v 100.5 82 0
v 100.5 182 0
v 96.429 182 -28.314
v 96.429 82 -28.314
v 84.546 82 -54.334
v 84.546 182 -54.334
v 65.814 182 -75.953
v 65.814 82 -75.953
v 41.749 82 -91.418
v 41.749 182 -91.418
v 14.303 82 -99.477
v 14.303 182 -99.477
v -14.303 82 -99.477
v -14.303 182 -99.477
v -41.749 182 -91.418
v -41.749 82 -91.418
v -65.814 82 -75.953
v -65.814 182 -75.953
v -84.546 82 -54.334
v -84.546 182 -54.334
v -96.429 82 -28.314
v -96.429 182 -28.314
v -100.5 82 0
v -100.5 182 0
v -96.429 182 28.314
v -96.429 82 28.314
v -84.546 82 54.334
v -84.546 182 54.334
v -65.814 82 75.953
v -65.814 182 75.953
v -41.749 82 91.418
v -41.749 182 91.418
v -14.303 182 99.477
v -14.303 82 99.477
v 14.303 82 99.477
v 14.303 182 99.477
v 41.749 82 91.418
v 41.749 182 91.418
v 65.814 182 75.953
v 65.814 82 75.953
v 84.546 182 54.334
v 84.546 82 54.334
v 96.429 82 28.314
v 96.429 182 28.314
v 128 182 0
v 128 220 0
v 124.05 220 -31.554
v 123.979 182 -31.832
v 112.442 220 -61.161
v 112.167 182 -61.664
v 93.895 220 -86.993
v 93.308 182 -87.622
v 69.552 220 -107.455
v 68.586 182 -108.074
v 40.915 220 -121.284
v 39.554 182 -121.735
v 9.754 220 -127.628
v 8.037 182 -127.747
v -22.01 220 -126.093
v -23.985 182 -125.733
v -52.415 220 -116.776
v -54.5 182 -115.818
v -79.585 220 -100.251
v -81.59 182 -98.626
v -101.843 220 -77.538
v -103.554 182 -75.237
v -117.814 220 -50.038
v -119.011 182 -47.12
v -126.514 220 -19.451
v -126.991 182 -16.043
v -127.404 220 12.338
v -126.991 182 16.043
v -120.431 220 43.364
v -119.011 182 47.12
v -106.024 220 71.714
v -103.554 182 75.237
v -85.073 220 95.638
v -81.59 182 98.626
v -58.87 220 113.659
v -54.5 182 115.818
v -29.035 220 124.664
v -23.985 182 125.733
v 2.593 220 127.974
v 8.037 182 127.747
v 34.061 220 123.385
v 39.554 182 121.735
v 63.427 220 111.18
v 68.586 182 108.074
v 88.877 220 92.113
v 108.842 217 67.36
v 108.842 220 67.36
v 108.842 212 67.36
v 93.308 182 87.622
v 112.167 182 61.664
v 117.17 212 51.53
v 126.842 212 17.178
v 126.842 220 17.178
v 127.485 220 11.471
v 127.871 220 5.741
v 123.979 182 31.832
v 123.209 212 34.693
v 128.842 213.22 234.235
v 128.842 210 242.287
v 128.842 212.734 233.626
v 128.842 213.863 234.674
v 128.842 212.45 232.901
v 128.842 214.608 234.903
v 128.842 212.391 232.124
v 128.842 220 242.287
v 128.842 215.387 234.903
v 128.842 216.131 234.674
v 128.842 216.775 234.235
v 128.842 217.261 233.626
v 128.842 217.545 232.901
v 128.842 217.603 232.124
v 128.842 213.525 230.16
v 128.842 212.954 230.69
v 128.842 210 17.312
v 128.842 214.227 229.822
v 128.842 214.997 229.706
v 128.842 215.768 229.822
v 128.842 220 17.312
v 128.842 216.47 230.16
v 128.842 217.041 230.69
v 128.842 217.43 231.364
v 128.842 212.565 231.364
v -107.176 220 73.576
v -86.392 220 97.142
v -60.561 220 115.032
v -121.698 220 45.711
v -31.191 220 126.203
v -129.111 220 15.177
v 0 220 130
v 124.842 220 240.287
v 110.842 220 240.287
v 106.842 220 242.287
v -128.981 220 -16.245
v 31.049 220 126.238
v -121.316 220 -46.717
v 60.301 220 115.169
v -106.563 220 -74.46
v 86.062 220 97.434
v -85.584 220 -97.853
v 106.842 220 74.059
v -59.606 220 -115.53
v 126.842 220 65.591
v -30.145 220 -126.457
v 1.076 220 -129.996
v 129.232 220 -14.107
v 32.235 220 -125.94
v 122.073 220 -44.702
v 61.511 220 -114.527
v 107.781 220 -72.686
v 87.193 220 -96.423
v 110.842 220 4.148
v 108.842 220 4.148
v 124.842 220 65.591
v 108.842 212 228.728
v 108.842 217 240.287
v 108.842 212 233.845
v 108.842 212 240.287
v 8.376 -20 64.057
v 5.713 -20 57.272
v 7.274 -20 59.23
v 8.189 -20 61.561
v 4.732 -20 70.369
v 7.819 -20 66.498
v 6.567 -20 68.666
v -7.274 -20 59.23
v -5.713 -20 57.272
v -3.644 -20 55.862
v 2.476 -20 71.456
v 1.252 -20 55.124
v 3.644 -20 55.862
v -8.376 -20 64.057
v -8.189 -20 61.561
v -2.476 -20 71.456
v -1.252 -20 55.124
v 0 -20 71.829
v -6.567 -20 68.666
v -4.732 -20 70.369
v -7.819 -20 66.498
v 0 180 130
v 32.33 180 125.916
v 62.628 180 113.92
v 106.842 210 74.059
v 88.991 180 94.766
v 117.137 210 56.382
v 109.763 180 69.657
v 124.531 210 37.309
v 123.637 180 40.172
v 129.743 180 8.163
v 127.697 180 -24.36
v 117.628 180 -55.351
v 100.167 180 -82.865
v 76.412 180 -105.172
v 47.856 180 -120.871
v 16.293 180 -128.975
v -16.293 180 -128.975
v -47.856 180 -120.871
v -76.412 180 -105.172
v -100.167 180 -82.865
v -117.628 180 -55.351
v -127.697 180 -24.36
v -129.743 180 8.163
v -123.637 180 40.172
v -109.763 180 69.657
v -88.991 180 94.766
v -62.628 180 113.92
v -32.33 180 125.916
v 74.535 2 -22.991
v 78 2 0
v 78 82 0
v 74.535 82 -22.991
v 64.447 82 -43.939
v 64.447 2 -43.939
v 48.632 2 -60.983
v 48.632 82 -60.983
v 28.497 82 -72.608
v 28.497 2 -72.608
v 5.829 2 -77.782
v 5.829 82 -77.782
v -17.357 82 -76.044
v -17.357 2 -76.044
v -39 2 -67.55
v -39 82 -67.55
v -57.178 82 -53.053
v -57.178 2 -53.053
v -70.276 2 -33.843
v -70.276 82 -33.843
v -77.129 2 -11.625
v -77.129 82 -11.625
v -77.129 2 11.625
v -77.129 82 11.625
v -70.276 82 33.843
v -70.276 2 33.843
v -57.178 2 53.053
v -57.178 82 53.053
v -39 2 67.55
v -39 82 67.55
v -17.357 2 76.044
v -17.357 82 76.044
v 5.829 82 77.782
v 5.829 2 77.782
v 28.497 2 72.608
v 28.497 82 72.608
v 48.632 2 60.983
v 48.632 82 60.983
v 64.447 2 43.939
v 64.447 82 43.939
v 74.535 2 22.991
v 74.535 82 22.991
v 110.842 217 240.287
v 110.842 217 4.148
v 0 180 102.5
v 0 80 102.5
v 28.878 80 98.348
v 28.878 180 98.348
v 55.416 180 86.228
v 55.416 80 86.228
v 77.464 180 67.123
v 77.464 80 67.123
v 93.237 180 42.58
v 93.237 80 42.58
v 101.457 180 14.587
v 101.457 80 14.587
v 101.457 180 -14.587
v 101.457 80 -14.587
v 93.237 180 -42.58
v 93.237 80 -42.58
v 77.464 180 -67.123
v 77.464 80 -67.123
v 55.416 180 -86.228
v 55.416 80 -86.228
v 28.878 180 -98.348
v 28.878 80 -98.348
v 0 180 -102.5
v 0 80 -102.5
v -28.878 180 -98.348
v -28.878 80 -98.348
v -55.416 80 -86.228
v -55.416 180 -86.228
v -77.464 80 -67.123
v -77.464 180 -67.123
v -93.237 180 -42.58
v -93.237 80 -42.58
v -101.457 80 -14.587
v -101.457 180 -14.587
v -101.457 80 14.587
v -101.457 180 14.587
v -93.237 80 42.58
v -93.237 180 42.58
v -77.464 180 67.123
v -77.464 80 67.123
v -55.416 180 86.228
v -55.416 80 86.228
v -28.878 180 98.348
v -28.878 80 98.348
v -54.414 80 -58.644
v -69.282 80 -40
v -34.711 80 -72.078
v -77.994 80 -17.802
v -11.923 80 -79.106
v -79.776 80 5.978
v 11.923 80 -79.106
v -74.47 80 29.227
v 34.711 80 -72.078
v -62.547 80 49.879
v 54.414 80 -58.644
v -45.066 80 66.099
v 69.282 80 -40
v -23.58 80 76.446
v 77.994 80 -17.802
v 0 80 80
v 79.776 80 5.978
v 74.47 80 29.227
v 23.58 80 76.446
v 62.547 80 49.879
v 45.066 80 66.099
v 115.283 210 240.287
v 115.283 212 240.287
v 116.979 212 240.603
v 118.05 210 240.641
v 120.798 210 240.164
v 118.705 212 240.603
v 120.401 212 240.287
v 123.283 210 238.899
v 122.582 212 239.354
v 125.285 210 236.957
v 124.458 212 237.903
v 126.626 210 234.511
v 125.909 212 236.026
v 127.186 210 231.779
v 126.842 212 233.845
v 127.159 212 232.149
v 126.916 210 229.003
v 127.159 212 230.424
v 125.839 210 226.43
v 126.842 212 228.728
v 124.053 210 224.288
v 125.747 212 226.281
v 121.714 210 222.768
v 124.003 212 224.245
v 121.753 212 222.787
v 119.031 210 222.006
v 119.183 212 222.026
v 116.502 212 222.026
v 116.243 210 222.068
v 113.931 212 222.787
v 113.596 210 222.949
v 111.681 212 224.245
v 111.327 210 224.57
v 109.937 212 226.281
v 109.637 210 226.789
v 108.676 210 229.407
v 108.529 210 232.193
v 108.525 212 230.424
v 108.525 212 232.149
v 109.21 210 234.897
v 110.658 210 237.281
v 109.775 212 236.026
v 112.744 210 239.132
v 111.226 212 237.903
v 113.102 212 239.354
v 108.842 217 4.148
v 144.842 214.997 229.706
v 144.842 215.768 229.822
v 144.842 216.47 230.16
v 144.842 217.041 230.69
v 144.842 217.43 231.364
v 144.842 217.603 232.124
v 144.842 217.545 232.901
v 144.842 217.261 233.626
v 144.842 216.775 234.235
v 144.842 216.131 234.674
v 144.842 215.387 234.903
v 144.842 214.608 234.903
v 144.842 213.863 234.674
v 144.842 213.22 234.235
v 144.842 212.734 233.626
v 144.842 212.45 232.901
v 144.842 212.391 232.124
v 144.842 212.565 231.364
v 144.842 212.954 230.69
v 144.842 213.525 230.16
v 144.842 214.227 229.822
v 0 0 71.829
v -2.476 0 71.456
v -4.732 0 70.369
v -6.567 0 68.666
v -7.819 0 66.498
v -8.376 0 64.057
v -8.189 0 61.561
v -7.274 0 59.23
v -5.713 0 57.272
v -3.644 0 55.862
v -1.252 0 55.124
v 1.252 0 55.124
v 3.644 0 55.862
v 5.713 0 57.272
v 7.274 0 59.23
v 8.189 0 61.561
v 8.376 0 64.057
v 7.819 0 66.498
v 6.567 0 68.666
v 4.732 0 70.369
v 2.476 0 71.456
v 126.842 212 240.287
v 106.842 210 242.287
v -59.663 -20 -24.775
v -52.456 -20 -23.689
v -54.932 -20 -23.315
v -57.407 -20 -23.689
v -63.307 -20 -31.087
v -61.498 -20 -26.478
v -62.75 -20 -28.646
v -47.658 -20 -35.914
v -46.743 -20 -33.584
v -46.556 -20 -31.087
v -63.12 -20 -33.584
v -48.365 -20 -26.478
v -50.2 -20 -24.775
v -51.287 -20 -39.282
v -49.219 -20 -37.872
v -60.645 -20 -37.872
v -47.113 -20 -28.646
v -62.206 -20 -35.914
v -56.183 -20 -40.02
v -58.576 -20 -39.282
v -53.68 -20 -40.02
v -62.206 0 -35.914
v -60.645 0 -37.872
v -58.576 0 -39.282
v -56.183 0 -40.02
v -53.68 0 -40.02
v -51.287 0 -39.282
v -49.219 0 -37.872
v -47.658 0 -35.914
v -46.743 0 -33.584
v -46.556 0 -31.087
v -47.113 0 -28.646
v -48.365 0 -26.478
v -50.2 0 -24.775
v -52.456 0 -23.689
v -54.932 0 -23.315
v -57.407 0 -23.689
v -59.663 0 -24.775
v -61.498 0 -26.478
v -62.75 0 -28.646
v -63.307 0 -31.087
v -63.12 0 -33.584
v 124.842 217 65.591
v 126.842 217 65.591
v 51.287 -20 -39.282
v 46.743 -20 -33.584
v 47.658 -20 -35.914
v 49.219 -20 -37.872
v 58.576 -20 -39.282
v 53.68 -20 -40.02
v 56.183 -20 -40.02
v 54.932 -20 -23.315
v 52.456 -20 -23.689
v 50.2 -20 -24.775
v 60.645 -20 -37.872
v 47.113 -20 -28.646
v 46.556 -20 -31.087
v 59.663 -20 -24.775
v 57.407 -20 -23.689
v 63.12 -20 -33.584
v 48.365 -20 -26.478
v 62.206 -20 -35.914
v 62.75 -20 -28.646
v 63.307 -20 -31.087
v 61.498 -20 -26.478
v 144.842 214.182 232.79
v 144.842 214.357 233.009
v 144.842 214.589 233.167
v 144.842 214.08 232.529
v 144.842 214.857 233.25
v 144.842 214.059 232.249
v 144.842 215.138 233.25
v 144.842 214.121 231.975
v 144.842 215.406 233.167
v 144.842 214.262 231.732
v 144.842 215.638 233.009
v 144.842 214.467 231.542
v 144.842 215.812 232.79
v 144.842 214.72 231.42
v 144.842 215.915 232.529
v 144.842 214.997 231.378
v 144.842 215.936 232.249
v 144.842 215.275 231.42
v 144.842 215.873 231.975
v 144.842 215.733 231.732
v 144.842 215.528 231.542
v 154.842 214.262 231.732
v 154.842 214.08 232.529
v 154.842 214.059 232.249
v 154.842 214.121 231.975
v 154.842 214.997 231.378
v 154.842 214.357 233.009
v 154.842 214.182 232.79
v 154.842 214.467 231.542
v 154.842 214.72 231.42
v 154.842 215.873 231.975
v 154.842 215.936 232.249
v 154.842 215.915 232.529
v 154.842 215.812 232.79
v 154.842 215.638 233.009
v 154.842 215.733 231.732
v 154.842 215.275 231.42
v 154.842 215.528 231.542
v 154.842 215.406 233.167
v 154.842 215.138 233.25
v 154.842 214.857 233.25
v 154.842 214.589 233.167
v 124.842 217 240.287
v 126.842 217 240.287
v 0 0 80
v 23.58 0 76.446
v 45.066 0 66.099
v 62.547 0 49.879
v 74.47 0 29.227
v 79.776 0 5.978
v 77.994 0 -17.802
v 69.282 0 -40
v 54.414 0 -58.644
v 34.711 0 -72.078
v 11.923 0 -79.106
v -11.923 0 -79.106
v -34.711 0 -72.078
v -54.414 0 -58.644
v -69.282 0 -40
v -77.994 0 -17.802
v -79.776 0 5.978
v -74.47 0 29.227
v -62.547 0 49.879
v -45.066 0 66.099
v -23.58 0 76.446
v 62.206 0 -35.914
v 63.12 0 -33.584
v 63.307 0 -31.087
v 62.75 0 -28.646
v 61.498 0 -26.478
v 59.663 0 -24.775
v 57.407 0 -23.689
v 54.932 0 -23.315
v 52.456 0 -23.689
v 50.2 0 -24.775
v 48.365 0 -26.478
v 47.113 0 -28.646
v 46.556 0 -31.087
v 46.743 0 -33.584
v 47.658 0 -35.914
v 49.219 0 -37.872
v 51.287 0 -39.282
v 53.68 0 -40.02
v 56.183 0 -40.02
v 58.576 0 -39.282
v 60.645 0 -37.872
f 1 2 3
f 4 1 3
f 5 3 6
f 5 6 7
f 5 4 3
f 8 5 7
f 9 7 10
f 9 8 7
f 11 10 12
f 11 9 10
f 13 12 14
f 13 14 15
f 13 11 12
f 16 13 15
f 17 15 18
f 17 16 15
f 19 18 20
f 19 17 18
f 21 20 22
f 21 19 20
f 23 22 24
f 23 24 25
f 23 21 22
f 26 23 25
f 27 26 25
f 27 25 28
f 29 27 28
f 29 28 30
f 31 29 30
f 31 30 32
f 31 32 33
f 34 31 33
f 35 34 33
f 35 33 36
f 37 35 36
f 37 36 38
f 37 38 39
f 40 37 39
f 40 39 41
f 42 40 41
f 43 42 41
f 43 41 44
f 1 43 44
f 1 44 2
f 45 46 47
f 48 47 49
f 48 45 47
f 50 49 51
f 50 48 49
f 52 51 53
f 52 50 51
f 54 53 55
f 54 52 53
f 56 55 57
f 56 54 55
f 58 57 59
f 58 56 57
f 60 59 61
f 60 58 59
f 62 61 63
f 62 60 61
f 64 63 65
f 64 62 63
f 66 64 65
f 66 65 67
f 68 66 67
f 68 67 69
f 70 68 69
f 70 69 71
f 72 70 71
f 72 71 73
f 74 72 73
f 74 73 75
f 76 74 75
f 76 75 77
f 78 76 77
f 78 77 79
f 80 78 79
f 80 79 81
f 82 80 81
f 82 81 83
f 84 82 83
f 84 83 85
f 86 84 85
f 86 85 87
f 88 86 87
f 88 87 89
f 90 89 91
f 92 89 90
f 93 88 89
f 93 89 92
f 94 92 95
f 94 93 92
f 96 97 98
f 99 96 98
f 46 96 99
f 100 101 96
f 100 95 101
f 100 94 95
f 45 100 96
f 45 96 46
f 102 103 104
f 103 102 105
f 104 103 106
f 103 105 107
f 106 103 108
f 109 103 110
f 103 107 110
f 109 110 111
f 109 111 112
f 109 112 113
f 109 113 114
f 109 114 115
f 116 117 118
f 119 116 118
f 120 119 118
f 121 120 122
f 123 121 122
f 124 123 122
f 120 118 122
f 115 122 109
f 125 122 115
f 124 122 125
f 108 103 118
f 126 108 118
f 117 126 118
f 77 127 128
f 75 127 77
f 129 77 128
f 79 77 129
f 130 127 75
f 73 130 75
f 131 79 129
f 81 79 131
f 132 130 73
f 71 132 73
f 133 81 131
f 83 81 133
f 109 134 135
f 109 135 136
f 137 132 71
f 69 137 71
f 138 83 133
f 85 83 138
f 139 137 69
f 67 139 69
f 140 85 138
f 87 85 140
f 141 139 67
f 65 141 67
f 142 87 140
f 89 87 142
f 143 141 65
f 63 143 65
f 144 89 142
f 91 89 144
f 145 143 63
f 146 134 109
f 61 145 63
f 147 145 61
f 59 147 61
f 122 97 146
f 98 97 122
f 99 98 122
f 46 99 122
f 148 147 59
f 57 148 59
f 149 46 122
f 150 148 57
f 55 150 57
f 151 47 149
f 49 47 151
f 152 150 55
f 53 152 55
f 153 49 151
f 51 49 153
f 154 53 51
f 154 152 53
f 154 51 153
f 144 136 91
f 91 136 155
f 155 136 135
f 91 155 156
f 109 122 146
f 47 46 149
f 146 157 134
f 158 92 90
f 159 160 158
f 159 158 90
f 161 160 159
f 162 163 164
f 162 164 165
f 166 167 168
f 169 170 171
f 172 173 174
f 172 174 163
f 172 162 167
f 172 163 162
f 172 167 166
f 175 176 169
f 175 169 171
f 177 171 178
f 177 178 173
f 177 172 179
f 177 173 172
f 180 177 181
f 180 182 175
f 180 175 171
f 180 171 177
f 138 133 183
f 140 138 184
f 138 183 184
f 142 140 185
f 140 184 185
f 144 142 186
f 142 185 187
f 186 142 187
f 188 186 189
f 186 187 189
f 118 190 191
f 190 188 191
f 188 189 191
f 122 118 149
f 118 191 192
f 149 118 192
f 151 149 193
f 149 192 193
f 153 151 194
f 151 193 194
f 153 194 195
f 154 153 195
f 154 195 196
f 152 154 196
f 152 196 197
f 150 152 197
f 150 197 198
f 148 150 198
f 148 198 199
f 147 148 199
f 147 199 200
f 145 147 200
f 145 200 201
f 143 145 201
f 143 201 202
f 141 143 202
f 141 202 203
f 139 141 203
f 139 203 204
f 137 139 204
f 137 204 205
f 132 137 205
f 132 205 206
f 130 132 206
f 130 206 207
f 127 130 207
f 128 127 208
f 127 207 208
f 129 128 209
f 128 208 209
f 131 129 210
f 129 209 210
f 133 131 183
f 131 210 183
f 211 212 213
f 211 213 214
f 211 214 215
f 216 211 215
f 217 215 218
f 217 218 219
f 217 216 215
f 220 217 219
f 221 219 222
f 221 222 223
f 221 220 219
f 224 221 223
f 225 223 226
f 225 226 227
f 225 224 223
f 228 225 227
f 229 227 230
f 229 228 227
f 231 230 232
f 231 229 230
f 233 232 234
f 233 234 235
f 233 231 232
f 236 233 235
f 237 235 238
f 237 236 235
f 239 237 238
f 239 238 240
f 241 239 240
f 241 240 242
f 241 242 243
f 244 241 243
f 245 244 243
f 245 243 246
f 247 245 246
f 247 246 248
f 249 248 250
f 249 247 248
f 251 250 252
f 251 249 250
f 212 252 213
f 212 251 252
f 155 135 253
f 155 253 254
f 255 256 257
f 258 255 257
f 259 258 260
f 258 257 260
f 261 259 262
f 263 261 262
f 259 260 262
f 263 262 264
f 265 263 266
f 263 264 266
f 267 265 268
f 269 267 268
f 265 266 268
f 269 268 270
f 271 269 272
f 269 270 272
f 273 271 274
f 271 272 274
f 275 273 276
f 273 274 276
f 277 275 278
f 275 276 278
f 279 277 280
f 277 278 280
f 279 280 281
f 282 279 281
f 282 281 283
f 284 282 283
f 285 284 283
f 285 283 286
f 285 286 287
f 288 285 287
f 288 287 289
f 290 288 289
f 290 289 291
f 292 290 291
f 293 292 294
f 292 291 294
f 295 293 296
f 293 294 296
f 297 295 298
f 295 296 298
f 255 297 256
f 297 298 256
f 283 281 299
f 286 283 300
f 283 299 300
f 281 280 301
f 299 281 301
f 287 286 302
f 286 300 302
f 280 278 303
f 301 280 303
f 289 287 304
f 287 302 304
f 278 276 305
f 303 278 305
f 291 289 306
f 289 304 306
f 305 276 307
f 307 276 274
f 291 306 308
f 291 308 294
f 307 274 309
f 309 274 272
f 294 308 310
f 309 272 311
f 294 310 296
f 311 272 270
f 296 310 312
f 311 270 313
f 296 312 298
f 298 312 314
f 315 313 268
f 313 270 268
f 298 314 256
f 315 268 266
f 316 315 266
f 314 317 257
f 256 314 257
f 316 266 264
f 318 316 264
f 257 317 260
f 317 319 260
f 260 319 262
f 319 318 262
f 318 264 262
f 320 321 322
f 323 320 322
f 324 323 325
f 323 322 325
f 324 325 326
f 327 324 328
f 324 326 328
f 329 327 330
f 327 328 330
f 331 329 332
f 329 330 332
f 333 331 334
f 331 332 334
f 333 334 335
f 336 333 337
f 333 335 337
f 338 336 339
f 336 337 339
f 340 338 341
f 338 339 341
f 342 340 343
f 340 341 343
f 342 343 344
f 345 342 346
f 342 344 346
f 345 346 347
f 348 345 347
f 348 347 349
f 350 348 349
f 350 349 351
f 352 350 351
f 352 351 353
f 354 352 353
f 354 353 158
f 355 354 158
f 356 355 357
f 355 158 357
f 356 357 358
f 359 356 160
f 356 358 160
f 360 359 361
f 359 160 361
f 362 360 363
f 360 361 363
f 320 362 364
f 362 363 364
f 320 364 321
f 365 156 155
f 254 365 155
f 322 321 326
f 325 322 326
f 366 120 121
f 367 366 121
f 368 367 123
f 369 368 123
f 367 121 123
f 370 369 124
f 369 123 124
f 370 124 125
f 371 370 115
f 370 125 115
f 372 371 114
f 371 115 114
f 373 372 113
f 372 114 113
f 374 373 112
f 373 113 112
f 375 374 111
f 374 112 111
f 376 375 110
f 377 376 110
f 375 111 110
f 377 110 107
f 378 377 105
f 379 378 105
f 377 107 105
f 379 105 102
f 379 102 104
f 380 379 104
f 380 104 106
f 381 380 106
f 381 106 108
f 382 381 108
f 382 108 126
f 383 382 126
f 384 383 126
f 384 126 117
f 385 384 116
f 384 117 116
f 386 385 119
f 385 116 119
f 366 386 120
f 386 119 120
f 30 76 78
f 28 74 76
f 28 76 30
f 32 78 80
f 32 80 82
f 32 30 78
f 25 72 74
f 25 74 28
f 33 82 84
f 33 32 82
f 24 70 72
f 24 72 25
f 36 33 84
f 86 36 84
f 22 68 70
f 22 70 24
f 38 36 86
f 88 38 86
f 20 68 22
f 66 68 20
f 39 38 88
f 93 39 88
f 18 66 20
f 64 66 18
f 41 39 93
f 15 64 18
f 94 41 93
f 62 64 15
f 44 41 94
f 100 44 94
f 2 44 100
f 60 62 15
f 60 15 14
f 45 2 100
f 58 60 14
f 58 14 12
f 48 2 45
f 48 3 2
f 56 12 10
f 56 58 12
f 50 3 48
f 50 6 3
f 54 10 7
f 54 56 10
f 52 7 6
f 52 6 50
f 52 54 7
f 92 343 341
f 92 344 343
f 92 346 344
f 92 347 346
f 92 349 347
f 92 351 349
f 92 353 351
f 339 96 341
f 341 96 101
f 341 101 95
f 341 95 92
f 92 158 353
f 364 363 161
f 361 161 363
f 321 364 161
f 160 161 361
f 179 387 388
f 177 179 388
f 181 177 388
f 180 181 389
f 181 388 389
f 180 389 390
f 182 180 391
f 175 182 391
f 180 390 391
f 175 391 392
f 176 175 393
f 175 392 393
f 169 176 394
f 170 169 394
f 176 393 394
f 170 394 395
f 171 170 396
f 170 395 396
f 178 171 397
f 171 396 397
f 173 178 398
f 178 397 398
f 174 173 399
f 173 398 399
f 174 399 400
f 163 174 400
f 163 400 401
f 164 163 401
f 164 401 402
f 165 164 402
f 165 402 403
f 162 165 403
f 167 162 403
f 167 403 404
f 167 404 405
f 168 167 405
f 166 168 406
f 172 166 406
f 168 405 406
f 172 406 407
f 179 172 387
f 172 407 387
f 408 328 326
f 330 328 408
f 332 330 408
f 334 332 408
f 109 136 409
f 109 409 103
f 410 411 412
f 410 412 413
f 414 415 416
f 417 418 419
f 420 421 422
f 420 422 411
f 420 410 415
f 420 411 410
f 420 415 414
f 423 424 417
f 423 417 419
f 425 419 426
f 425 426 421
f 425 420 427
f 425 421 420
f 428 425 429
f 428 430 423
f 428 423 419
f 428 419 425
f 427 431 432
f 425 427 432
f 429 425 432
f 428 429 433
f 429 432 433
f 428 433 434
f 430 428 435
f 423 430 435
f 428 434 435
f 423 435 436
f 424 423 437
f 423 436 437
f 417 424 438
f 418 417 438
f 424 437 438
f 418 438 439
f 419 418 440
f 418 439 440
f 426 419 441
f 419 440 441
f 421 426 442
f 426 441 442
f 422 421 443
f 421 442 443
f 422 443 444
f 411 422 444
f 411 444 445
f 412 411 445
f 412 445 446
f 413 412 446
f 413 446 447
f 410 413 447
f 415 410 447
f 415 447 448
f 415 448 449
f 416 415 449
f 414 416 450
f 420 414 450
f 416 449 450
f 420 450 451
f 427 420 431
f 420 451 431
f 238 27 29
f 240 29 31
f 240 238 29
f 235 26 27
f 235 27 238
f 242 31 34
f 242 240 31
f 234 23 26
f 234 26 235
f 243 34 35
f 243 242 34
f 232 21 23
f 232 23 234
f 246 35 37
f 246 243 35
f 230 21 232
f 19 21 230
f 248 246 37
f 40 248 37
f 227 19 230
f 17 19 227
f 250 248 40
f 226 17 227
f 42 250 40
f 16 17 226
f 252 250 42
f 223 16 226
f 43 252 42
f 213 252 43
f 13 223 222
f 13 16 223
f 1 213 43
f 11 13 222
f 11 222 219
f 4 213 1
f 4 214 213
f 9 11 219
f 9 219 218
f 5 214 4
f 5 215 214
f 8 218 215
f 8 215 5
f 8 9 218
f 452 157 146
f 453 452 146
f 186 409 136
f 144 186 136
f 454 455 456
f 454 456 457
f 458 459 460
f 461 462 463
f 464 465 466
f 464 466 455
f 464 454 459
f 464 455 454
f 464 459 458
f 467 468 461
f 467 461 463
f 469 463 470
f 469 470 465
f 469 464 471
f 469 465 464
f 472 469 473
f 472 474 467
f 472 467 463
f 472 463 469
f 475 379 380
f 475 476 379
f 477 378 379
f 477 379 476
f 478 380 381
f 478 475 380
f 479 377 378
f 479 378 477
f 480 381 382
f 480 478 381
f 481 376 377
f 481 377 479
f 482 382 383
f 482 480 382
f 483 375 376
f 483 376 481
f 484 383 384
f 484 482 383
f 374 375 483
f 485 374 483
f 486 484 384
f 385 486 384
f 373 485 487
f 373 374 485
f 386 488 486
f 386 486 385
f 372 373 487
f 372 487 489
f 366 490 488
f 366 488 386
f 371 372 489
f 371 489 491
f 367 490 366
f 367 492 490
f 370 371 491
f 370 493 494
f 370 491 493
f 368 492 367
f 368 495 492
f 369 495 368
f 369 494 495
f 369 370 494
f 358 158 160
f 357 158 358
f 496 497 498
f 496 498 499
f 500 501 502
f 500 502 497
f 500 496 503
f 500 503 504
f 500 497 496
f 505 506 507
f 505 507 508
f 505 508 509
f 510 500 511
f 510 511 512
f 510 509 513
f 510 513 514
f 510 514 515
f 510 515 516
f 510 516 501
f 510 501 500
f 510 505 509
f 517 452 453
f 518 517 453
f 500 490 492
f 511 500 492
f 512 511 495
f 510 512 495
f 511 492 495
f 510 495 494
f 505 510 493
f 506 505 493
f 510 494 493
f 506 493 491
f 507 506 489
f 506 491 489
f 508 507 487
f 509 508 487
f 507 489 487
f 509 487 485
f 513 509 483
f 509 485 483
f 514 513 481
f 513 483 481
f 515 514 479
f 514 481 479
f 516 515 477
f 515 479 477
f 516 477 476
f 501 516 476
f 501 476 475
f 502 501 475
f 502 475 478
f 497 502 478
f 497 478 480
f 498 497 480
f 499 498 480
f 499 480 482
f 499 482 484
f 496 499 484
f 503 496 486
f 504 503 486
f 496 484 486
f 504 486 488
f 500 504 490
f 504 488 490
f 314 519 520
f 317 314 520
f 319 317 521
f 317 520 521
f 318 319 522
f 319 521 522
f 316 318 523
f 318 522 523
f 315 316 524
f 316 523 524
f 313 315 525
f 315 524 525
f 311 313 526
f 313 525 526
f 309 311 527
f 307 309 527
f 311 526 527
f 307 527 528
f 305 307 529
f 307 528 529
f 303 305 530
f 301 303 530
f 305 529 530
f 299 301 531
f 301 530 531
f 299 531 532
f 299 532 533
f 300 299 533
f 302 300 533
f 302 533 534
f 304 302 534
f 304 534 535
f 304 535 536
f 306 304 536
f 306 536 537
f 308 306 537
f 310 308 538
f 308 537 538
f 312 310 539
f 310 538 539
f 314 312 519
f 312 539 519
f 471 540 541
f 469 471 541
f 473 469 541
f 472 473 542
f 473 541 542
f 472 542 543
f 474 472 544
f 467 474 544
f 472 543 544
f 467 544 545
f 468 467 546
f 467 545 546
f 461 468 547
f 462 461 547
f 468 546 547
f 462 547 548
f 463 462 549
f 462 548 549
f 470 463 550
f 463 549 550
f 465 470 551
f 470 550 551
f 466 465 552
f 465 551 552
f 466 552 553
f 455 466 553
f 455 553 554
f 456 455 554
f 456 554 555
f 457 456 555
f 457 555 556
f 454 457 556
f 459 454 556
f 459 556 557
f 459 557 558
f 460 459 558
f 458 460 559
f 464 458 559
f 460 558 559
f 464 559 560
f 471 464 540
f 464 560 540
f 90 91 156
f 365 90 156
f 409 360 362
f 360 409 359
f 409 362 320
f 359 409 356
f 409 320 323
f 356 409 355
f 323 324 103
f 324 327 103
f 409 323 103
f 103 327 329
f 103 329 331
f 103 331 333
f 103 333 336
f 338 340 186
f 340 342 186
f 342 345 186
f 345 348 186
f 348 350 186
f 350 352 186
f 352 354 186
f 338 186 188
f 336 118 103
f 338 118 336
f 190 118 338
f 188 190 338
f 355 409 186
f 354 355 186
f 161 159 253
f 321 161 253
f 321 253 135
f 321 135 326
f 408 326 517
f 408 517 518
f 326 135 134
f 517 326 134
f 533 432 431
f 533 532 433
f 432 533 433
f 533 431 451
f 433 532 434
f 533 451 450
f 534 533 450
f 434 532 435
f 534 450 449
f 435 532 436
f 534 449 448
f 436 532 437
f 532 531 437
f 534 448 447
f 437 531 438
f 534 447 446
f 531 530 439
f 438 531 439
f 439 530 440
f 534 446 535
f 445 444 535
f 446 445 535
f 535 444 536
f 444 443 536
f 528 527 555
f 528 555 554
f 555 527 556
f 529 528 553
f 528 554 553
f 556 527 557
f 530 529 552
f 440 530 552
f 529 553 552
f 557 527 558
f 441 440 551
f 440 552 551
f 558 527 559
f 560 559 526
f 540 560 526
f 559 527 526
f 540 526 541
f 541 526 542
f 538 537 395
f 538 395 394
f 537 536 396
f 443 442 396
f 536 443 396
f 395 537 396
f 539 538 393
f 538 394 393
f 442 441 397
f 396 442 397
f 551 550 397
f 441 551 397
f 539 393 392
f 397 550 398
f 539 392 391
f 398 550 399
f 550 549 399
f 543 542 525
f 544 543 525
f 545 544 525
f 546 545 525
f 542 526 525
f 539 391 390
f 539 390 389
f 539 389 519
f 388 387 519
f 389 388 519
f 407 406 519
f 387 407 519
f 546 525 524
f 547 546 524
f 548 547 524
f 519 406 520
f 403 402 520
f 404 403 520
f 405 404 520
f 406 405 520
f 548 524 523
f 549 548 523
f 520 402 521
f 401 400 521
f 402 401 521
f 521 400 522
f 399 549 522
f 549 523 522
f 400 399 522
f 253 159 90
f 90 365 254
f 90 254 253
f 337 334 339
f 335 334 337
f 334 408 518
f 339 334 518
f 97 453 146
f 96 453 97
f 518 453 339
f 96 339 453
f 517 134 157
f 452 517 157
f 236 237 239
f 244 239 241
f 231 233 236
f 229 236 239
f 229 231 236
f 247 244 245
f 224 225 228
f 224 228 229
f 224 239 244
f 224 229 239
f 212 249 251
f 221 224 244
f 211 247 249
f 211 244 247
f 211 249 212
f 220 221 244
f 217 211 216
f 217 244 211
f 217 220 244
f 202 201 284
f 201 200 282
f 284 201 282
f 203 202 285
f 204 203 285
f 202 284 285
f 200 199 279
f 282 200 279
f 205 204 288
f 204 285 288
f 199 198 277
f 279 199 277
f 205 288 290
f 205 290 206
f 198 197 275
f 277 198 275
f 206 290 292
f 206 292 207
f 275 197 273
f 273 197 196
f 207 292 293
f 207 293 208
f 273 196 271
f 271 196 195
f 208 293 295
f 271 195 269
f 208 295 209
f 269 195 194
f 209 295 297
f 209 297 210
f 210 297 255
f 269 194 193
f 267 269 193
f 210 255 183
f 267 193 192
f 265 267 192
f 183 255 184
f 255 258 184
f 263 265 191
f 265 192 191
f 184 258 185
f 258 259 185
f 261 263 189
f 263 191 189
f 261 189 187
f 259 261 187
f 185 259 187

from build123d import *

# Parameters (mm, degrees)
SKETCH_3_R               = 80
EXTRUDE_1_DEPTH          = 80
SKETCH_4_R               = 102.5
EXTRUDE_2_DEPTH          = 100
SKETCH_5_R               = 130
EXTRUDE_3_DEPTH          = 40
SKETCH_6_W               = 22
SKETCH_6_H               = 240.840734586
EXTRUDE_4_DEPTH          = 10
SHELL_START              = 82
SHELL_1_OUTLINE_R        = 100.5
SHELL_1_DEPTH            = 138
SHELL_START_2            = 2
SHELL_1_2_OUTLINE_R      = 78
SHELL_1_2_DEPTH          = 80
SHELL_START_3            = 182
SHELL_1_3_OUTLINE_R      = 128
SHELL_1_3_OUTLINE_R_2    = 100.5
SHELL_1_3_DEPTH          = 38
SHELL_START_4            = 212
SHELL_1_4_DEPTH          = 8
SKETCH_7_R               = 8.399329468
EXTRUDE_5_DEPTH          = 20
PATTERN_CIRCULAR_1_COUNT = 3
SKETCH_9_W               = 22
SKETCH_9_H               = 2
CUT_EXTRUDE_1_DEPTH      = 365.969552782
SKETCH_10_W              = 2
SKETCH_10_H              = 236.138085802
SKETCH_10_H_2            = 174.695606664
EXTRUDE_6_DEPTH          = 3
SKETCH_11_W              = 22
SKETCH_11_H              = 10
EXTRUDE_7_DEPTH          = 2
SKETCH_12_R              = 9.35670837
CUT_EXTRUDE_2_DEPTH      = 360.759328521
SKETCH_13_R              = 2.613319885
EXTRUDE_8_DEPTH          = 16
SKETCH_14_R              = 0.941183601
EXTRUDE_9_DEPTH          = 10


# Read off the part's stored shape, not the designer's step: 抽壳1
with BuildPart() as part:
    # 草图3 → 凸台-拉伸1 (new body)
    with BuildSketch(Plane(origin=(0, 0, 0), x_dir=(1, 0, 0), z_dir=(0, 1, 0))):
        with Locations(Location((0, 0, 0), (0, 0, 270))):
            Circle(SKETCH_3_R)
    extrude(amount=EXTRUDE_1_DEPTH)

    # 草图4 → 凸台-拉伸2 (add)
    with BuildSketch(Plane(origin=(0, 80, 0), x_dir=(1, 0, 0), z_dir=(0, 1, 0))):
        with Locations(Location((0, 0, 0), (0, 0, 270))):
            Circle(SKETCH_4_R)
    extrude(amount=EXTRUDE_2_DEPTH)

    # 草图5 → 凸台-拉伸3 (add)
    with BuildSketch(Plane(origin=(0, 180, 0), x_dir=(1, 0, 0), z_dir=(0, 1, 0))):
        with Locations(Location((0, 0, 0), (0, 0, 270))):
            Circle(SKETCH_5_R)
    extrude(amount=EXTRUDE_3_DEPTH)

    # 草图6 → 凸台-拉伸4 (add)
    with BuildSketch(Plane(origin=(0, 220, 0), x_dir=(1, 0, 0), z_dir=(0, 1, 0))):
        with Locations((117.8420905, -121.866187138)):
            Rectangle(SKETCH_6_W, SKETCH_6_H)
    extrude(amount=-EXTRUDE_4_DEPTH)

    # 抽壳1 outline → 抽壳1 (cut)
    with BuildSketch(Plane(origin=(0, 0, 0), x_dir=(1, 0, 0), z_dir=(0, 1, 0)).offset(SHELL_START)):
        Circle(SHELL_1_OUTLINE_R)
    extrude(amount=SHELL_1_DEPTH, mode=Mode.SUBTRACT)

    # Shell 1 2 outline → Shell 1 2 (cut)
    with BuildSketch(Plane(origin=(0, 0, 0), x_dir=(1, 0, 0), z_dir=(0, 1, 0)).offset(SHELL_START_2)):
        Circle(SHELL_1_2_OUTLINE_R)
    extrude(amount=SHELL_1_2_DEPTH, mode=Mode.SUBTRACT)

    # Shell 1 3 outline → Shell 1 3 (cut)
    with BuildSketch(Plane(origin=(0, 0, 0), x_dir=(1, 0, 0), z_dir=(0, 1, 0)).offset(SHELL_START_3)):
        Circle(SHELL_1_3_OUTLINE_R)
        Circle(SHELL_1_3_OUTLINE_R_2, mode=Mode.SUBTRACT)
    extrude(amount=SHELL_1_3_DEPTH, mode=Mode.SUBTRACT)

    # Shell 1 4 outline → Shell 1 4 (cut)
    with BuildSketch(Plane(origin=(0, 0, 0), x_dir=(1, 0, 0), z_dir=(0, 1, 0)).offset(SHELL_START_4)):
        with BuildLine():
            ThreePointArc((126.8420905, -17.178011456), (120.483699417, -43.216642337), (108.8420905, -67.360220721))
            Line((108.8420905, -67.360220721), (108.8420905, -240.286554431))
            Line((108.8420905, -240.286554431), (126.8420905, -240.286554431))
            Line((126.8420905, -240.286554431), (126.8420905, -17.178011456))
        make_face()
    extrude(amount=SHELL_1_4_DEPTH, mode=Mode.SUBTRACT)

    # 草图7 → 凸台-拉伸5 (add)
    with BuildSketch(Plane.XZ):
        with Locations(Location((0, 63.429571018, 0), (0, 0, 90))):
            Circle(SKETCH_7_R)
    extrude_5 = extrude(amount=EXTRUDE_5_DEPTH)

    # 阵列(圆周)1: 凸台-拉伸5 ×3 about axis
    pattern_circular_1_axis = Axis((0, 0, 0), (0, 1, 0))
    for i in range(1, PATTERN_CIRCULAR_1_COUNT):
        add(extrude_5.rotate(pattern_circular_1_axis, i * 360 / PATTERN_CIRCULAR_1_COUNT))

    # 草图9 → 切除-拉伸1 (cut, through all)
    with BuildSketch(Plane(origin=(0, 220, 0), x_dir=(1, 0, 0), z_dir=(0, 1, 0))):
        with Locations((117.8420905, -241.286554431)):
            Rectangle(SKETCH_9_W, SKETCH_9_H)
    extrude(amount=-CUT_EXTRUDE_1_DEPTH, mode=Mode.SUBTRACT)

    # 草图10 → 凸台-拉伸6 (add)
    with BuildSketch(Plane(origin=(0, 220, 0), x_dir=(1, 0, 0), z_dir=(0, 1, 0))):
        with Locations((109.8420905, -122.21751153)):
            Rectangle(SKETCH_10_W, SKETCH_10_H)
        with Locations((125.8420905, -152.938751099)):
            Rectangle(SKETCH_10_W, SKETCH_10_H_2)
    extrude(amount=-EXTRUDE_6_DEPTH)

    # 草图11 → 凸台-拉伸7 (add)
    with BuildSketch(Plane.XY.offset(240.286554431)):
        with Locations((117.8420905, 215)):
            Rectangle(SKETCH_11_W, SKETCH_11_H)
    extrude(amount=EXTRUDE_7_DEPTH)

    # 草图12 → 切除-拉伸2 (cut, through all)
    with BuildSketch(Plane(origin=(0, 212, 0), x_dir=(1, 0, 0), z_dir=(0, 1, 0))):
        with Locations(Location((117.8420905, -231.286554431, 0), (0, 0, 254.128345291))):
            Circle(SKETCH_12_R)
    extrude(amount=-CUT_EXTRUDE_2_DEPTH, mode=Mode.SUBTRACT)

    # 草图13 → 凸台-拉伸8 (add)
    with BuildSketch(Plane(origin=(128.8420905, 0, 0), x_dir=(0, 0, -1), z_dir=(1, 0, 0))):
        with Locations((-232.319143826, 214.997371462)):
            Circle(SKETCH_13_R)
    extrude(amount=EXTRUDE_8_DEPTH)

    # 草图14 → 凸台-拉伸9 (add)
    with BuildSketch(Plane(origin=(144.8420905, 0, 0), x_dir=(0, 0, -1), z_dir=(1, 0, 0))):
        with Locations((-232.319143826, 214.997371462)):
            Circle(SKETCH_14_R)
    extrude(amount=EXTRUDE_9_DEPTH)


solid = part.part
